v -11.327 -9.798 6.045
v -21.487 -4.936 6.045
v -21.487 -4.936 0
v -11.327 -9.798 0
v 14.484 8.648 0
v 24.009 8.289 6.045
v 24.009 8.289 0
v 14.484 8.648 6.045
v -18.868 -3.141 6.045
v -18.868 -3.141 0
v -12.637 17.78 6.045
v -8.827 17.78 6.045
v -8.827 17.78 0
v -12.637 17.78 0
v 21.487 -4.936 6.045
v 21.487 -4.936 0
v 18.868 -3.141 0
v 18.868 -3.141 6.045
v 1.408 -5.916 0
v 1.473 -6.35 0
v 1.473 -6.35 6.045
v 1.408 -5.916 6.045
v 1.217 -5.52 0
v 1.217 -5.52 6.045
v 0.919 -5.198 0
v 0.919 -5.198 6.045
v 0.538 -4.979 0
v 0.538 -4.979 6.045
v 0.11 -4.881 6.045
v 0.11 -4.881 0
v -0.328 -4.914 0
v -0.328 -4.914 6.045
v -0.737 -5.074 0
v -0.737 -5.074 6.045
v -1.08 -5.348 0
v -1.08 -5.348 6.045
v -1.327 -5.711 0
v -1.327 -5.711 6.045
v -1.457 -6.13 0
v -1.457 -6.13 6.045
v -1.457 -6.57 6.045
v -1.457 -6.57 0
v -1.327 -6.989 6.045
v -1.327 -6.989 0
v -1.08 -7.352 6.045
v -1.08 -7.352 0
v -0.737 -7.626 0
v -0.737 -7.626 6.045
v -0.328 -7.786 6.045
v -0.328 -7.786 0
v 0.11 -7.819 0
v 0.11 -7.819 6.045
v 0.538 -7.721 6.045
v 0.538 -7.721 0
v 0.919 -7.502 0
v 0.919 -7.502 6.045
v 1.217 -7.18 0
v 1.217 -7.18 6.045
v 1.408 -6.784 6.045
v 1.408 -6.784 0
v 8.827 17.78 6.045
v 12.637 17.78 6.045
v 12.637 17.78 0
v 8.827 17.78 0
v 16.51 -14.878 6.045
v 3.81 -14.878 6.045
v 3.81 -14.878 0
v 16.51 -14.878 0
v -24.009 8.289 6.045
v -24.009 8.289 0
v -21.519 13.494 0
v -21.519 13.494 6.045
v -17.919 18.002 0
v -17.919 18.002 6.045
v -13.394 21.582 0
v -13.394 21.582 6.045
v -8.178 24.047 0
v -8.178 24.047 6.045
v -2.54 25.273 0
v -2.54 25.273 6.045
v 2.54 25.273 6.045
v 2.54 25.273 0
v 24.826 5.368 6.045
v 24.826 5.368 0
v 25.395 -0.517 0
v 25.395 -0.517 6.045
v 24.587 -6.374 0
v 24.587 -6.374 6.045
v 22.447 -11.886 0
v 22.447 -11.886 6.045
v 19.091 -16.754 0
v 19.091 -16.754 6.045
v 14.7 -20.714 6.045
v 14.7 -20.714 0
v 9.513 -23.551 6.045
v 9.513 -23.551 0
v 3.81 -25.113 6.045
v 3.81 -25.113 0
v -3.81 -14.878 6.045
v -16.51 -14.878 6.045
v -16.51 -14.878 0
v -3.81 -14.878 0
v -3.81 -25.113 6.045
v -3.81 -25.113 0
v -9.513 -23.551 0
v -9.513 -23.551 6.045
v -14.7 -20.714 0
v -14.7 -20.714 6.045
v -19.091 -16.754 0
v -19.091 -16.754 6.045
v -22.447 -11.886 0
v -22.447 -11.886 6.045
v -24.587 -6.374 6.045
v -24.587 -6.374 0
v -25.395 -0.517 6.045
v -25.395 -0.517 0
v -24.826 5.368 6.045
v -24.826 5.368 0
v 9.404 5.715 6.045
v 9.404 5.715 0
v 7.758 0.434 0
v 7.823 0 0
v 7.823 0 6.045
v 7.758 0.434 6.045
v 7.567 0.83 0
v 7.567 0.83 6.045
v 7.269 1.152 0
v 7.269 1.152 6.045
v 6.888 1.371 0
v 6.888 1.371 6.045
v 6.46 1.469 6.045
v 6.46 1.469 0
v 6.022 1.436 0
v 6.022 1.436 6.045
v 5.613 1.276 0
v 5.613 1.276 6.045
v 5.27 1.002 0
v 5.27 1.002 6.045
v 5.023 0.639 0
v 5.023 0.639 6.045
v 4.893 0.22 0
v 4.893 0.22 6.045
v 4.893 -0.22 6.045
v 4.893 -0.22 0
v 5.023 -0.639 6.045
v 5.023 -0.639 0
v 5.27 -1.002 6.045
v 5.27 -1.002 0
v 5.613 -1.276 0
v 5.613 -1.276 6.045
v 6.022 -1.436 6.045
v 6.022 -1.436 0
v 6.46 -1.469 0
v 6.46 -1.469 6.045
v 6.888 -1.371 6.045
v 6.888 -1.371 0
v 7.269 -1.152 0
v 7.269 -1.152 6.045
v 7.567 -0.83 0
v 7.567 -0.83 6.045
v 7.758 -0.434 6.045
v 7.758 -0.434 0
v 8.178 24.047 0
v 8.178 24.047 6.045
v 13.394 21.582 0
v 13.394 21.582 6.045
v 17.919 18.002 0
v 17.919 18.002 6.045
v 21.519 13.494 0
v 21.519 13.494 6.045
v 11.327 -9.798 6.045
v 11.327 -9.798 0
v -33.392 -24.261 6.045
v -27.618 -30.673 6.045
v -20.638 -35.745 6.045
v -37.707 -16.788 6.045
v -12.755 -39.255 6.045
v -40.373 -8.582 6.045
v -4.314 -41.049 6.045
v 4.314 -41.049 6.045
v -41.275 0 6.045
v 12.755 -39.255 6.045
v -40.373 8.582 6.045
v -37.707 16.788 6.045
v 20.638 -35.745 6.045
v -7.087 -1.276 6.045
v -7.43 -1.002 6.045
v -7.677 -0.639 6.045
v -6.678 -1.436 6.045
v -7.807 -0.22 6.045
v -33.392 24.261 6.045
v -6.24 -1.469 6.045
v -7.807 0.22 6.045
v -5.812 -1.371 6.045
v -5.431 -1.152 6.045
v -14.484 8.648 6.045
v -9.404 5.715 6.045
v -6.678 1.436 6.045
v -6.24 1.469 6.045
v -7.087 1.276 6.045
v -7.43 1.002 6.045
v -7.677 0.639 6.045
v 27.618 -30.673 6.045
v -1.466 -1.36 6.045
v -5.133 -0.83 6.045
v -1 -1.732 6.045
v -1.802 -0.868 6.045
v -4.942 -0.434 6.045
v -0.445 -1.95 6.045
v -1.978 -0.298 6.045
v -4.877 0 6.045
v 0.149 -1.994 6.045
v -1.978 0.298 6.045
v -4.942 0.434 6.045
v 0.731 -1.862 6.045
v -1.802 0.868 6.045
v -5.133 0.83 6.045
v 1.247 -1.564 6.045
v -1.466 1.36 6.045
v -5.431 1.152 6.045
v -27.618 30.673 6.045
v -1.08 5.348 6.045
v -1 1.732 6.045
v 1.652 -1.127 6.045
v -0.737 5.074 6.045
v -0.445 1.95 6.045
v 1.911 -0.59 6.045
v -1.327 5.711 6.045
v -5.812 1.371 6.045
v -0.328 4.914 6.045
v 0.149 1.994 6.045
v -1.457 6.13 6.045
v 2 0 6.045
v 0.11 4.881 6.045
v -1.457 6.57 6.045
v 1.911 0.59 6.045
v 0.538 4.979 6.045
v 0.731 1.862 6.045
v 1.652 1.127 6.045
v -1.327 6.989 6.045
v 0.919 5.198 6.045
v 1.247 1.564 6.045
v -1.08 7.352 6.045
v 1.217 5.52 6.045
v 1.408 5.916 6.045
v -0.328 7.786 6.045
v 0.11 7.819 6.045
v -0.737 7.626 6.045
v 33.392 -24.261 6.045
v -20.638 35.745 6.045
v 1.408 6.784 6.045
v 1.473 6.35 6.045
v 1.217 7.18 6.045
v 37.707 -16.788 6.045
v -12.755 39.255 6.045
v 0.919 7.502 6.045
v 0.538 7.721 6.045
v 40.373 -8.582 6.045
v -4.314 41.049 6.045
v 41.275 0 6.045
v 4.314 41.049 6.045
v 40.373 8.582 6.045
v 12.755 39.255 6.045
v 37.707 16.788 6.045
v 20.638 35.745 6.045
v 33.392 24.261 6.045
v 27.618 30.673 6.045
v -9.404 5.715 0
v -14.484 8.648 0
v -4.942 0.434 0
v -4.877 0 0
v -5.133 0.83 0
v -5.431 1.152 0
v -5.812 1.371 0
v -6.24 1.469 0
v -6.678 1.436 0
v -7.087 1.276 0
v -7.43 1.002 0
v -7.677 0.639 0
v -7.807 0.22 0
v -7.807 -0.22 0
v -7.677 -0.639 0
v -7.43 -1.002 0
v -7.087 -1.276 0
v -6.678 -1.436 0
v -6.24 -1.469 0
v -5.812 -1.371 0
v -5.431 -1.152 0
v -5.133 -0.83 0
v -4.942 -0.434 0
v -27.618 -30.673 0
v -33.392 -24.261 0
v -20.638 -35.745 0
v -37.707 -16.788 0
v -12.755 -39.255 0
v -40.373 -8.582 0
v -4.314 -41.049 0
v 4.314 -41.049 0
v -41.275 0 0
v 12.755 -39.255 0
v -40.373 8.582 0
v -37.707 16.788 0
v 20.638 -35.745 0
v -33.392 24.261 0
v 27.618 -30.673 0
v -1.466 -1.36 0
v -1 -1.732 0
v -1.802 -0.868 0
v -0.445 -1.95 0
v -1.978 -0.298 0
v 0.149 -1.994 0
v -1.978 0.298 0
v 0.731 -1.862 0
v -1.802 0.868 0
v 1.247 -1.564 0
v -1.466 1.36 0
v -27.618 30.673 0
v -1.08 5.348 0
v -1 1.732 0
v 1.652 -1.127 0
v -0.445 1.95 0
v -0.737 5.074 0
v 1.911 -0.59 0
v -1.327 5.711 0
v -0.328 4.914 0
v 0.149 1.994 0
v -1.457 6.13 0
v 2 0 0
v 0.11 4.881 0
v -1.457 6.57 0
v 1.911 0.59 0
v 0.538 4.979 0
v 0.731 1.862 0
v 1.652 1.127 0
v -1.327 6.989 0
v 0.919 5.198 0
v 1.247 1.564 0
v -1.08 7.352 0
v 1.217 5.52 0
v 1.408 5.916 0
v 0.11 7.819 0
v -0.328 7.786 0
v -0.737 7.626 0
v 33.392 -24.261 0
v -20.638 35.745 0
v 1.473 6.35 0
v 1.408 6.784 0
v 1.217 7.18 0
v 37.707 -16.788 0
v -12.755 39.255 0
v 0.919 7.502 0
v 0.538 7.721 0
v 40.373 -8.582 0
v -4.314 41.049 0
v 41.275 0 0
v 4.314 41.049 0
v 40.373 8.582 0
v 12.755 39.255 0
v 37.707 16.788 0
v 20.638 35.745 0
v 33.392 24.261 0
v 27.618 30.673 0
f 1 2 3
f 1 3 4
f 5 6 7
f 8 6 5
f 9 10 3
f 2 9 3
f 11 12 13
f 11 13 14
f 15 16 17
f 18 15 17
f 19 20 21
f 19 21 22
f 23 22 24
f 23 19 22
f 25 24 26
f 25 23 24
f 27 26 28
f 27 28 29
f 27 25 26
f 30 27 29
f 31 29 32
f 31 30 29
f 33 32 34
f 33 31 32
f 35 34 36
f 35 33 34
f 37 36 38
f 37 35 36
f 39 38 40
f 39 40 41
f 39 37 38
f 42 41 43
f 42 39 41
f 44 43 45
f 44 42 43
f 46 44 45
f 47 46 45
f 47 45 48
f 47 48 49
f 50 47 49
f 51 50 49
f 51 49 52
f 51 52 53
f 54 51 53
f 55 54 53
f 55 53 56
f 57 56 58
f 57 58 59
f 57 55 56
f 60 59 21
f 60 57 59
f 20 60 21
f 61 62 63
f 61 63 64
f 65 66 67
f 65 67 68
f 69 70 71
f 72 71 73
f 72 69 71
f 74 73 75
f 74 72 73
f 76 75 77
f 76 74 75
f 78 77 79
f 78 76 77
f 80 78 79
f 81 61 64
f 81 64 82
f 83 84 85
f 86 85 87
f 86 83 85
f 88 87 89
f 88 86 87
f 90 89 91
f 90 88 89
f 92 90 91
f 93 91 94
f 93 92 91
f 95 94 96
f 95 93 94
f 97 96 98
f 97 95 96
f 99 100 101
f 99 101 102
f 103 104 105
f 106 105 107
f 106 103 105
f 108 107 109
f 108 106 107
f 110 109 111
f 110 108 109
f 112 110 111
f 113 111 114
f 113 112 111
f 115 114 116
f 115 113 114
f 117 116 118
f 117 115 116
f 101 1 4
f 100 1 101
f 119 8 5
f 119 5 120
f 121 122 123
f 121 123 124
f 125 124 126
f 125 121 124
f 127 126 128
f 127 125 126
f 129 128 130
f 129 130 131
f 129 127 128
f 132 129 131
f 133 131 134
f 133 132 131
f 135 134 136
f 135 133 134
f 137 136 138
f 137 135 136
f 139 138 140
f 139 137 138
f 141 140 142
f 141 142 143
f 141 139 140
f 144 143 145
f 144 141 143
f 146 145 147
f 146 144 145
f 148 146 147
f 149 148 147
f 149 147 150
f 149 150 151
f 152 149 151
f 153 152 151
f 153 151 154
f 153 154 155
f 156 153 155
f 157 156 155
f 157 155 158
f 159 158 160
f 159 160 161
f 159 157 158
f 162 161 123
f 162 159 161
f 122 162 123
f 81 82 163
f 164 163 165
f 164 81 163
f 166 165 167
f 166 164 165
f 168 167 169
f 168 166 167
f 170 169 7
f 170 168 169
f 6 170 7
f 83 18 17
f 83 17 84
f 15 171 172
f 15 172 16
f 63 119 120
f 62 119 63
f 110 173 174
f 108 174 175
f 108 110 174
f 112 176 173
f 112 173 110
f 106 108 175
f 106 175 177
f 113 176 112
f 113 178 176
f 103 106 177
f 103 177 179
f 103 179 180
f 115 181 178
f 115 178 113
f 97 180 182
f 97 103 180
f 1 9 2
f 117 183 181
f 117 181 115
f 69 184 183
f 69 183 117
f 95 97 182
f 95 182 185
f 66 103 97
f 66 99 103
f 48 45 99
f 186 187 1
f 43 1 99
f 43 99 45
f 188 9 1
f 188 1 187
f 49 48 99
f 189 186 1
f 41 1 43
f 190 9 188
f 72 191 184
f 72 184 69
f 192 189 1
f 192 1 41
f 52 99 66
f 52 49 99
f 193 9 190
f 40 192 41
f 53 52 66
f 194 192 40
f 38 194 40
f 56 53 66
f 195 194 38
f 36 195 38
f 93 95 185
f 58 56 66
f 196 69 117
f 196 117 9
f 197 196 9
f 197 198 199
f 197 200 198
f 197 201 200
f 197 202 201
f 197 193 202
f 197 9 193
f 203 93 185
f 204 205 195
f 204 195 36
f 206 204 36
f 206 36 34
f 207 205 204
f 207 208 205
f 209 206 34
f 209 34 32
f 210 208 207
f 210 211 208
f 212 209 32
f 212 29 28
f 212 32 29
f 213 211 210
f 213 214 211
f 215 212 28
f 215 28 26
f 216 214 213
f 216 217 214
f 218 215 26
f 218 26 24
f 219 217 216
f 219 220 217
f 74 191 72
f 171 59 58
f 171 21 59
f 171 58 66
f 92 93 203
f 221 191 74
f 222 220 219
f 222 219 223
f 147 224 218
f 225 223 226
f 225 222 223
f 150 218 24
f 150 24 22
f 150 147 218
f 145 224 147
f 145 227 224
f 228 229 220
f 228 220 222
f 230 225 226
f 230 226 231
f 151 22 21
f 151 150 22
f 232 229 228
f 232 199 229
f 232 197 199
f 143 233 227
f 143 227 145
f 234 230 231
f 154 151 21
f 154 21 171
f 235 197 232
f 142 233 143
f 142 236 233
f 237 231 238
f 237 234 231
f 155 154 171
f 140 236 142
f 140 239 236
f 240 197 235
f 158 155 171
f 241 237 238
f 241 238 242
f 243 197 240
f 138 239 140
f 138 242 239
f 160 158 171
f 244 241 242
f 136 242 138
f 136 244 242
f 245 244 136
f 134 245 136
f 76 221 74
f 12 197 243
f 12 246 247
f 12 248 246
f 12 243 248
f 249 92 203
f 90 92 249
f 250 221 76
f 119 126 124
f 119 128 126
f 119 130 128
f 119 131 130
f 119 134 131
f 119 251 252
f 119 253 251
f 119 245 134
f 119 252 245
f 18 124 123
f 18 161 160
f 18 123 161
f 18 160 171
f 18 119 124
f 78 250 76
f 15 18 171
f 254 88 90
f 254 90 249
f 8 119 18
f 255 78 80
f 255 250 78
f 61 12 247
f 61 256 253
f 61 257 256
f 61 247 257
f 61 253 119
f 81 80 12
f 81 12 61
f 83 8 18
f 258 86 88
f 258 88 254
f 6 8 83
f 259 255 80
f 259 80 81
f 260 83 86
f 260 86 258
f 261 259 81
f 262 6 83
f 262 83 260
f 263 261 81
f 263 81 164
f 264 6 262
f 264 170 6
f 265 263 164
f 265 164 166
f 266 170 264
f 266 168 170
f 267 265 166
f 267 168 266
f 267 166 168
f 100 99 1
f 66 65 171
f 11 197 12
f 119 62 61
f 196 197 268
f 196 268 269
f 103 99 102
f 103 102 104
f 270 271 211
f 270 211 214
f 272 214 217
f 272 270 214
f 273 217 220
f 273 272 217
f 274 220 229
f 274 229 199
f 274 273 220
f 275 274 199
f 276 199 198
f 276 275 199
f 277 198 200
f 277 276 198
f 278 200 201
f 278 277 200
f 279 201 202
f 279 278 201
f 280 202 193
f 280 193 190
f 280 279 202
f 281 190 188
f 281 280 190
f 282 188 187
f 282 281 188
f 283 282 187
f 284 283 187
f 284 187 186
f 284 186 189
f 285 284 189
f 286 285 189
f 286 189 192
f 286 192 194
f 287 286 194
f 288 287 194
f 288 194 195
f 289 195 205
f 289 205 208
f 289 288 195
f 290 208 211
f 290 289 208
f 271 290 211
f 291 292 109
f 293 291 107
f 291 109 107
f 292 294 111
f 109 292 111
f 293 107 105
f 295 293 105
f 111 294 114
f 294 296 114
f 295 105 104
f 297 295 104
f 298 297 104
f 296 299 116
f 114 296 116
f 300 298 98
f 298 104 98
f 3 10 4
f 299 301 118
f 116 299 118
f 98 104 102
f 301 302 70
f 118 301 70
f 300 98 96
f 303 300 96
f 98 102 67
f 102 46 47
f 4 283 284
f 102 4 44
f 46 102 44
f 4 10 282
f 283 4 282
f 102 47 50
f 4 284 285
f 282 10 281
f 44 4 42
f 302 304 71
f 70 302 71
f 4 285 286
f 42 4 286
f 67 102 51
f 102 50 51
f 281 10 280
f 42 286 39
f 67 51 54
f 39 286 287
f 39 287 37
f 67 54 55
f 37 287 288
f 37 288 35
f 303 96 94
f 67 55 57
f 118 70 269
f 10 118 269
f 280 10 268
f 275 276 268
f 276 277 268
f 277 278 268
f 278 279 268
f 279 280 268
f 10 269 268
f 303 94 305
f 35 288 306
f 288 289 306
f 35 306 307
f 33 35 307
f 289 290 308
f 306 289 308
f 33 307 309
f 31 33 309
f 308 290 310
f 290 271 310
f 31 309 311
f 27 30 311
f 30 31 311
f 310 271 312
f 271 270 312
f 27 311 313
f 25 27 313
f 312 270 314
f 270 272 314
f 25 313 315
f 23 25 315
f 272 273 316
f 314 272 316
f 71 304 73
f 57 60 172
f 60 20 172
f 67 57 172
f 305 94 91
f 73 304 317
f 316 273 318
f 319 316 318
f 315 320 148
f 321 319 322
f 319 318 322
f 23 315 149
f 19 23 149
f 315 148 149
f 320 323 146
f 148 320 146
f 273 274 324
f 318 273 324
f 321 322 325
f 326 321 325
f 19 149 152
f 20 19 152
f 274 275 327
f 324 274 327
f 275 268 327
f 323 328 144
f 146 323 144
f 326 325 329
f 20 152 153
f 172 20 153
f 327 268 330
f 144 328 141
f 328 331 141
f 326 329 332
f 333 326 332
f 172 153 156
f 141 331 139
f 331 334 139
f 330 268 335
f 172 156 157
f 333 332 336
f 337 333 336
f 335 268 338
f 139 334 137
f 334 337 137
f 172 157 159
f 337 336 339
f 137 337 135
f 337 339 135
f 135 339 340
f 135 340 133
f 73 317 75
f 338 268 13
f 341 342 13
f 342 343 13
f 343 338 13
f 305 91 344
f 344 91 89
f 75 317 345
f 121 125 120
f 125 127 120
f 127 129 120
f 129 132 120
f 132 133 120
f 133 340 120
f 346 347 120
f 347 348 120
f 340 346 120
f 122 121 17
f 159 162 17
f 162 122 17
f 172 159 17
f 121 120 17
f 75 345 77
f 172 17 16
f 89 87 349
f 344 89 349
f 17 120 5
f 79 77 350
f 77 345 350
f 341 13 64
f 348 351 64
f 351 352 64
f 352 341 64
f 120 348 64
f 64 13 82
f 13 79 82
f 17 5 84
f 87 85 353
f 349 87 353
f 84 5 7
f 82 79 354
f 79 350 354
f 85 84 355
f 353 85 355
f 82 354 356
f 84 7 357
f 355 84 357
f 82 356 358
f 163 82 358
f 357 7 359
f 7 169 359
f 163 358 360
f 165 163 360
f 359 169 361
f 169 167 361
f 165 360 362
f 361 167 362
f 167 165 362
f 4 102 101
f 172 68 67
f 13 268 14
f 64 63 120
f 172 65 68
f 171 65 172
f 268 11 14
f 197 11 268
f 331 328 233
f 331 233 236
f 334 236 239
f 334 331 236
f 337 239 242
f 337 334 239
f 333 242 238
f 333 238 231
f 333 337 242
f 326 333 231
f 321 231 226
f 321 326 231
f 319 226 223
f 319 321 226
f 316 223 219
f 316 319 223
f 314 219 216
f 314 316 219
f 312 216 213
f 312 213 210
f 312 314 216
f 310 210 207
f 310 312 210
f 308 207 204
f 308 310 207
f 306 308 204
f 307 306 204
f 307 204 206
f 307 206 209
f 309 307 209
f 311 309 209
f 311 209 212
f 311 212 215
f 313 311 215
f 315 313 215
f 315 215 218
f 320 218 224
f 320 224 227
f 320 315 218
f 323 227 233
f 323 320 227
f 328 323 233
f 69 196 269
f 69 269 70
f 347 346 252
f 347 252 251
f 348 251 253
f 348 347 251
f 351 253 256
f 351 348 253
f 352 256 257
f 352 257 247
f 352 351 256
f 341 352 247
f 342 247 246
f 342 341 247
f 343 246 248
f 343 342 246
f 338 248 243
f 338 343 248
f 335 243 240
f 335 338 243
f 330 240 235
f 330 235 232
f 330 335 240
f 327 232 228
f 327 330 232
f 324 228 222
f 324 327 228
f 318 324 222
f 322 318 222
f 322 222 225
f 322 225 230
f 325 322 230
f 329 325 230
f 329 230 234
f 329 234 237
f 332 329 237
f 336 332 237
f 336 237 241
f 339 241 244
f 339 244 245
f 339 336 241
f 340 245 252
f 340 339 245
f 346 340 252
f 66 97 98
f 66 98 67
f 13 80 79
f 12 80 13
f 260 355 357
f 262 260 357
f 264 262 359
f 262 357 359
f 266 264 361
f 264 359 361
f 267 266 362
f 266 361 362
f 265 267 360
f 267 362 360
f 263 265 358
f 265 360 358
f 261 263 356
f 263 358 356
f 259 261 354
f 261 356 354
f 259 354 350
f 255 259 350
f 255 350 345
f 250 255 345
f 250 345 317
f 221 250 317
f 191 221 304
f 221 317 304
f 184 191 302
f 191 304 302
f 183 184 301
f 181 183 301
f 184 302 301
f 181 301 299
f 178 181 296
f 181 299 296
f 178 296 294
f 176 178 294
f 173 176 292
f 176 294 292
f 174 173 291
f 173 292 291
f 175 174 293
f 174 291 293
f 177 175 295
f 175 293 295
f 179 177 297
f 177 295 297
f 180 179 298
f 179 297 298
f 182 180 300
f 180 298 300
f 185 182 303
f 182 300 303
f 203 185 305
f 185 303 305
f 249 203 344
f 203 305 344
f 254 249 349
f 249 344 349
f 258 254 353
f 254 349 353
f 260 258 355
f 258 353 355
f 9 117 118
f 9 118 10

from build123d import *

# Parameters (mm, degrees)
SKETCH1_R           = 41.275
SKETCH1_R_2         = 1.4732
SKETCH1_R_3         = 2
BOSS_EXTRUDE1_DEPTH = 6.0452
CUT_EXTRUDE3_DEPTH  = 59.683862288


with BuildPart() as part:
    # Sketch1 → Boss-Extrude1 (new body)
    with BuildSketch(Plane.XY):
        Circle(SKETCH1_R)
        with Locations((-6.35, 0)):
            Circle(SKETCH1_R_2, mode=Mode.SUBTRACT)
        with Locations((0, 6.35)):
            Circle(SKETCH1_R_2, mode=Mode.SUBTRACT)
        with Locations((6.35, 0)):
            Circle(SKETCH1_R_2, mode=Mode.SUBTRACT)
        with Locations((0, -6.35)):
            Circle(SKETCH1_R_2, mode=Mode.SUBTRACT)
        Circle(SKETCH1_R_3, mode=Mode.SUBTRACT)
    extrude(amount=BOSS_EXTRUDE1_DEPTH)

    # Sketch2 → Cut-Extrude3 (cut, through all)
    with BuildSketch(Plane.XY.offset(6.0452)):
        with BuildLine():
            Line((8.827105782, 17.78), (2.54, 25.272680903))
            ThreePointArc((2.54, 25.272680903), (15.758317518, 19.920728626), (24.009298775, 8.289365013))
            Line((24.009298775, 8.289365013), (14.484298775, 8.647939367))
            Line((14.484298775, 8.647939367), (9.404298775, 5.715))
            Line((9.404298775, 5.715), (12.637105782, 17.78))
            Line((12.637105782, 17.78), (8.827105782, 17.78))
        make_face()
        with BuildLine():
            Line((18.868143133, -3.140634987), (24.826209076, 5.368365013))
            ThreePointArc((24.826209076, 5.368365013), (20.911260009, -14.418016674), (3.81, -25.112624315))
            Line((3.81, -25.112624315), (3.81, -14.877877919))
            Line((3.81, -14.877877919), (16.51, -14.877877919))
            Line((16.51, -14.877877919), (11.327081569, -9.797877919))
            Line((11.327081569, -9.797877919), (21.487081569, -4.935568543))
            Line((21.487081569, -4.935568543), (18.868143133, -3.140634987))
        make_face()
        with BuildLine():
            Line((-3.81, -14.877877919), (-3.81, -25.112624315))
            ThreePointArc((-3.81, -25.112624315), (-20.911260009, -14.418016674), (-24.826209076, 5.368365013))
            Line((-24.826209076, 5.368365013), (-18.868143133, -3.140634987))
            Line((-18.868143133, -3.140634987), (-21.487081569, -4.935568543))
            Line((-21.487081569, -4.935568543), (-11.327081569, -9.797877919))
            Line((-11.327081569, -9.797877919), (-16.51, -14.877877919))
            Line((-16.51, -14.877877919), (-3.81, -14.877877919))
        make_face()
        with BuildLine():
            Line((-14.484298775, 8.647939367), (-24.009298775, 8.289365013))
            ThreePointArc((-24.009298775, 8.289365013), (-15.758317518, 19.920728626), (-2.54, 25.272680903))
            Line((-2.54, 25.272680903), (-8.827105782, 17.78))
            Line((-8.827105782, 17.78), (-12.637105782, 17.78))
            Line((-12.637105782, 17.78), (-9.404298775, 5.715))
            Line((-9.404298775, 5.715), (-14.484298775, 8.647939367))
        make_face()
    extrude(amount=-CUT_EXTRUDE3_DEPTH, mode=Mode.SUBTRACT)


solid = part.part
